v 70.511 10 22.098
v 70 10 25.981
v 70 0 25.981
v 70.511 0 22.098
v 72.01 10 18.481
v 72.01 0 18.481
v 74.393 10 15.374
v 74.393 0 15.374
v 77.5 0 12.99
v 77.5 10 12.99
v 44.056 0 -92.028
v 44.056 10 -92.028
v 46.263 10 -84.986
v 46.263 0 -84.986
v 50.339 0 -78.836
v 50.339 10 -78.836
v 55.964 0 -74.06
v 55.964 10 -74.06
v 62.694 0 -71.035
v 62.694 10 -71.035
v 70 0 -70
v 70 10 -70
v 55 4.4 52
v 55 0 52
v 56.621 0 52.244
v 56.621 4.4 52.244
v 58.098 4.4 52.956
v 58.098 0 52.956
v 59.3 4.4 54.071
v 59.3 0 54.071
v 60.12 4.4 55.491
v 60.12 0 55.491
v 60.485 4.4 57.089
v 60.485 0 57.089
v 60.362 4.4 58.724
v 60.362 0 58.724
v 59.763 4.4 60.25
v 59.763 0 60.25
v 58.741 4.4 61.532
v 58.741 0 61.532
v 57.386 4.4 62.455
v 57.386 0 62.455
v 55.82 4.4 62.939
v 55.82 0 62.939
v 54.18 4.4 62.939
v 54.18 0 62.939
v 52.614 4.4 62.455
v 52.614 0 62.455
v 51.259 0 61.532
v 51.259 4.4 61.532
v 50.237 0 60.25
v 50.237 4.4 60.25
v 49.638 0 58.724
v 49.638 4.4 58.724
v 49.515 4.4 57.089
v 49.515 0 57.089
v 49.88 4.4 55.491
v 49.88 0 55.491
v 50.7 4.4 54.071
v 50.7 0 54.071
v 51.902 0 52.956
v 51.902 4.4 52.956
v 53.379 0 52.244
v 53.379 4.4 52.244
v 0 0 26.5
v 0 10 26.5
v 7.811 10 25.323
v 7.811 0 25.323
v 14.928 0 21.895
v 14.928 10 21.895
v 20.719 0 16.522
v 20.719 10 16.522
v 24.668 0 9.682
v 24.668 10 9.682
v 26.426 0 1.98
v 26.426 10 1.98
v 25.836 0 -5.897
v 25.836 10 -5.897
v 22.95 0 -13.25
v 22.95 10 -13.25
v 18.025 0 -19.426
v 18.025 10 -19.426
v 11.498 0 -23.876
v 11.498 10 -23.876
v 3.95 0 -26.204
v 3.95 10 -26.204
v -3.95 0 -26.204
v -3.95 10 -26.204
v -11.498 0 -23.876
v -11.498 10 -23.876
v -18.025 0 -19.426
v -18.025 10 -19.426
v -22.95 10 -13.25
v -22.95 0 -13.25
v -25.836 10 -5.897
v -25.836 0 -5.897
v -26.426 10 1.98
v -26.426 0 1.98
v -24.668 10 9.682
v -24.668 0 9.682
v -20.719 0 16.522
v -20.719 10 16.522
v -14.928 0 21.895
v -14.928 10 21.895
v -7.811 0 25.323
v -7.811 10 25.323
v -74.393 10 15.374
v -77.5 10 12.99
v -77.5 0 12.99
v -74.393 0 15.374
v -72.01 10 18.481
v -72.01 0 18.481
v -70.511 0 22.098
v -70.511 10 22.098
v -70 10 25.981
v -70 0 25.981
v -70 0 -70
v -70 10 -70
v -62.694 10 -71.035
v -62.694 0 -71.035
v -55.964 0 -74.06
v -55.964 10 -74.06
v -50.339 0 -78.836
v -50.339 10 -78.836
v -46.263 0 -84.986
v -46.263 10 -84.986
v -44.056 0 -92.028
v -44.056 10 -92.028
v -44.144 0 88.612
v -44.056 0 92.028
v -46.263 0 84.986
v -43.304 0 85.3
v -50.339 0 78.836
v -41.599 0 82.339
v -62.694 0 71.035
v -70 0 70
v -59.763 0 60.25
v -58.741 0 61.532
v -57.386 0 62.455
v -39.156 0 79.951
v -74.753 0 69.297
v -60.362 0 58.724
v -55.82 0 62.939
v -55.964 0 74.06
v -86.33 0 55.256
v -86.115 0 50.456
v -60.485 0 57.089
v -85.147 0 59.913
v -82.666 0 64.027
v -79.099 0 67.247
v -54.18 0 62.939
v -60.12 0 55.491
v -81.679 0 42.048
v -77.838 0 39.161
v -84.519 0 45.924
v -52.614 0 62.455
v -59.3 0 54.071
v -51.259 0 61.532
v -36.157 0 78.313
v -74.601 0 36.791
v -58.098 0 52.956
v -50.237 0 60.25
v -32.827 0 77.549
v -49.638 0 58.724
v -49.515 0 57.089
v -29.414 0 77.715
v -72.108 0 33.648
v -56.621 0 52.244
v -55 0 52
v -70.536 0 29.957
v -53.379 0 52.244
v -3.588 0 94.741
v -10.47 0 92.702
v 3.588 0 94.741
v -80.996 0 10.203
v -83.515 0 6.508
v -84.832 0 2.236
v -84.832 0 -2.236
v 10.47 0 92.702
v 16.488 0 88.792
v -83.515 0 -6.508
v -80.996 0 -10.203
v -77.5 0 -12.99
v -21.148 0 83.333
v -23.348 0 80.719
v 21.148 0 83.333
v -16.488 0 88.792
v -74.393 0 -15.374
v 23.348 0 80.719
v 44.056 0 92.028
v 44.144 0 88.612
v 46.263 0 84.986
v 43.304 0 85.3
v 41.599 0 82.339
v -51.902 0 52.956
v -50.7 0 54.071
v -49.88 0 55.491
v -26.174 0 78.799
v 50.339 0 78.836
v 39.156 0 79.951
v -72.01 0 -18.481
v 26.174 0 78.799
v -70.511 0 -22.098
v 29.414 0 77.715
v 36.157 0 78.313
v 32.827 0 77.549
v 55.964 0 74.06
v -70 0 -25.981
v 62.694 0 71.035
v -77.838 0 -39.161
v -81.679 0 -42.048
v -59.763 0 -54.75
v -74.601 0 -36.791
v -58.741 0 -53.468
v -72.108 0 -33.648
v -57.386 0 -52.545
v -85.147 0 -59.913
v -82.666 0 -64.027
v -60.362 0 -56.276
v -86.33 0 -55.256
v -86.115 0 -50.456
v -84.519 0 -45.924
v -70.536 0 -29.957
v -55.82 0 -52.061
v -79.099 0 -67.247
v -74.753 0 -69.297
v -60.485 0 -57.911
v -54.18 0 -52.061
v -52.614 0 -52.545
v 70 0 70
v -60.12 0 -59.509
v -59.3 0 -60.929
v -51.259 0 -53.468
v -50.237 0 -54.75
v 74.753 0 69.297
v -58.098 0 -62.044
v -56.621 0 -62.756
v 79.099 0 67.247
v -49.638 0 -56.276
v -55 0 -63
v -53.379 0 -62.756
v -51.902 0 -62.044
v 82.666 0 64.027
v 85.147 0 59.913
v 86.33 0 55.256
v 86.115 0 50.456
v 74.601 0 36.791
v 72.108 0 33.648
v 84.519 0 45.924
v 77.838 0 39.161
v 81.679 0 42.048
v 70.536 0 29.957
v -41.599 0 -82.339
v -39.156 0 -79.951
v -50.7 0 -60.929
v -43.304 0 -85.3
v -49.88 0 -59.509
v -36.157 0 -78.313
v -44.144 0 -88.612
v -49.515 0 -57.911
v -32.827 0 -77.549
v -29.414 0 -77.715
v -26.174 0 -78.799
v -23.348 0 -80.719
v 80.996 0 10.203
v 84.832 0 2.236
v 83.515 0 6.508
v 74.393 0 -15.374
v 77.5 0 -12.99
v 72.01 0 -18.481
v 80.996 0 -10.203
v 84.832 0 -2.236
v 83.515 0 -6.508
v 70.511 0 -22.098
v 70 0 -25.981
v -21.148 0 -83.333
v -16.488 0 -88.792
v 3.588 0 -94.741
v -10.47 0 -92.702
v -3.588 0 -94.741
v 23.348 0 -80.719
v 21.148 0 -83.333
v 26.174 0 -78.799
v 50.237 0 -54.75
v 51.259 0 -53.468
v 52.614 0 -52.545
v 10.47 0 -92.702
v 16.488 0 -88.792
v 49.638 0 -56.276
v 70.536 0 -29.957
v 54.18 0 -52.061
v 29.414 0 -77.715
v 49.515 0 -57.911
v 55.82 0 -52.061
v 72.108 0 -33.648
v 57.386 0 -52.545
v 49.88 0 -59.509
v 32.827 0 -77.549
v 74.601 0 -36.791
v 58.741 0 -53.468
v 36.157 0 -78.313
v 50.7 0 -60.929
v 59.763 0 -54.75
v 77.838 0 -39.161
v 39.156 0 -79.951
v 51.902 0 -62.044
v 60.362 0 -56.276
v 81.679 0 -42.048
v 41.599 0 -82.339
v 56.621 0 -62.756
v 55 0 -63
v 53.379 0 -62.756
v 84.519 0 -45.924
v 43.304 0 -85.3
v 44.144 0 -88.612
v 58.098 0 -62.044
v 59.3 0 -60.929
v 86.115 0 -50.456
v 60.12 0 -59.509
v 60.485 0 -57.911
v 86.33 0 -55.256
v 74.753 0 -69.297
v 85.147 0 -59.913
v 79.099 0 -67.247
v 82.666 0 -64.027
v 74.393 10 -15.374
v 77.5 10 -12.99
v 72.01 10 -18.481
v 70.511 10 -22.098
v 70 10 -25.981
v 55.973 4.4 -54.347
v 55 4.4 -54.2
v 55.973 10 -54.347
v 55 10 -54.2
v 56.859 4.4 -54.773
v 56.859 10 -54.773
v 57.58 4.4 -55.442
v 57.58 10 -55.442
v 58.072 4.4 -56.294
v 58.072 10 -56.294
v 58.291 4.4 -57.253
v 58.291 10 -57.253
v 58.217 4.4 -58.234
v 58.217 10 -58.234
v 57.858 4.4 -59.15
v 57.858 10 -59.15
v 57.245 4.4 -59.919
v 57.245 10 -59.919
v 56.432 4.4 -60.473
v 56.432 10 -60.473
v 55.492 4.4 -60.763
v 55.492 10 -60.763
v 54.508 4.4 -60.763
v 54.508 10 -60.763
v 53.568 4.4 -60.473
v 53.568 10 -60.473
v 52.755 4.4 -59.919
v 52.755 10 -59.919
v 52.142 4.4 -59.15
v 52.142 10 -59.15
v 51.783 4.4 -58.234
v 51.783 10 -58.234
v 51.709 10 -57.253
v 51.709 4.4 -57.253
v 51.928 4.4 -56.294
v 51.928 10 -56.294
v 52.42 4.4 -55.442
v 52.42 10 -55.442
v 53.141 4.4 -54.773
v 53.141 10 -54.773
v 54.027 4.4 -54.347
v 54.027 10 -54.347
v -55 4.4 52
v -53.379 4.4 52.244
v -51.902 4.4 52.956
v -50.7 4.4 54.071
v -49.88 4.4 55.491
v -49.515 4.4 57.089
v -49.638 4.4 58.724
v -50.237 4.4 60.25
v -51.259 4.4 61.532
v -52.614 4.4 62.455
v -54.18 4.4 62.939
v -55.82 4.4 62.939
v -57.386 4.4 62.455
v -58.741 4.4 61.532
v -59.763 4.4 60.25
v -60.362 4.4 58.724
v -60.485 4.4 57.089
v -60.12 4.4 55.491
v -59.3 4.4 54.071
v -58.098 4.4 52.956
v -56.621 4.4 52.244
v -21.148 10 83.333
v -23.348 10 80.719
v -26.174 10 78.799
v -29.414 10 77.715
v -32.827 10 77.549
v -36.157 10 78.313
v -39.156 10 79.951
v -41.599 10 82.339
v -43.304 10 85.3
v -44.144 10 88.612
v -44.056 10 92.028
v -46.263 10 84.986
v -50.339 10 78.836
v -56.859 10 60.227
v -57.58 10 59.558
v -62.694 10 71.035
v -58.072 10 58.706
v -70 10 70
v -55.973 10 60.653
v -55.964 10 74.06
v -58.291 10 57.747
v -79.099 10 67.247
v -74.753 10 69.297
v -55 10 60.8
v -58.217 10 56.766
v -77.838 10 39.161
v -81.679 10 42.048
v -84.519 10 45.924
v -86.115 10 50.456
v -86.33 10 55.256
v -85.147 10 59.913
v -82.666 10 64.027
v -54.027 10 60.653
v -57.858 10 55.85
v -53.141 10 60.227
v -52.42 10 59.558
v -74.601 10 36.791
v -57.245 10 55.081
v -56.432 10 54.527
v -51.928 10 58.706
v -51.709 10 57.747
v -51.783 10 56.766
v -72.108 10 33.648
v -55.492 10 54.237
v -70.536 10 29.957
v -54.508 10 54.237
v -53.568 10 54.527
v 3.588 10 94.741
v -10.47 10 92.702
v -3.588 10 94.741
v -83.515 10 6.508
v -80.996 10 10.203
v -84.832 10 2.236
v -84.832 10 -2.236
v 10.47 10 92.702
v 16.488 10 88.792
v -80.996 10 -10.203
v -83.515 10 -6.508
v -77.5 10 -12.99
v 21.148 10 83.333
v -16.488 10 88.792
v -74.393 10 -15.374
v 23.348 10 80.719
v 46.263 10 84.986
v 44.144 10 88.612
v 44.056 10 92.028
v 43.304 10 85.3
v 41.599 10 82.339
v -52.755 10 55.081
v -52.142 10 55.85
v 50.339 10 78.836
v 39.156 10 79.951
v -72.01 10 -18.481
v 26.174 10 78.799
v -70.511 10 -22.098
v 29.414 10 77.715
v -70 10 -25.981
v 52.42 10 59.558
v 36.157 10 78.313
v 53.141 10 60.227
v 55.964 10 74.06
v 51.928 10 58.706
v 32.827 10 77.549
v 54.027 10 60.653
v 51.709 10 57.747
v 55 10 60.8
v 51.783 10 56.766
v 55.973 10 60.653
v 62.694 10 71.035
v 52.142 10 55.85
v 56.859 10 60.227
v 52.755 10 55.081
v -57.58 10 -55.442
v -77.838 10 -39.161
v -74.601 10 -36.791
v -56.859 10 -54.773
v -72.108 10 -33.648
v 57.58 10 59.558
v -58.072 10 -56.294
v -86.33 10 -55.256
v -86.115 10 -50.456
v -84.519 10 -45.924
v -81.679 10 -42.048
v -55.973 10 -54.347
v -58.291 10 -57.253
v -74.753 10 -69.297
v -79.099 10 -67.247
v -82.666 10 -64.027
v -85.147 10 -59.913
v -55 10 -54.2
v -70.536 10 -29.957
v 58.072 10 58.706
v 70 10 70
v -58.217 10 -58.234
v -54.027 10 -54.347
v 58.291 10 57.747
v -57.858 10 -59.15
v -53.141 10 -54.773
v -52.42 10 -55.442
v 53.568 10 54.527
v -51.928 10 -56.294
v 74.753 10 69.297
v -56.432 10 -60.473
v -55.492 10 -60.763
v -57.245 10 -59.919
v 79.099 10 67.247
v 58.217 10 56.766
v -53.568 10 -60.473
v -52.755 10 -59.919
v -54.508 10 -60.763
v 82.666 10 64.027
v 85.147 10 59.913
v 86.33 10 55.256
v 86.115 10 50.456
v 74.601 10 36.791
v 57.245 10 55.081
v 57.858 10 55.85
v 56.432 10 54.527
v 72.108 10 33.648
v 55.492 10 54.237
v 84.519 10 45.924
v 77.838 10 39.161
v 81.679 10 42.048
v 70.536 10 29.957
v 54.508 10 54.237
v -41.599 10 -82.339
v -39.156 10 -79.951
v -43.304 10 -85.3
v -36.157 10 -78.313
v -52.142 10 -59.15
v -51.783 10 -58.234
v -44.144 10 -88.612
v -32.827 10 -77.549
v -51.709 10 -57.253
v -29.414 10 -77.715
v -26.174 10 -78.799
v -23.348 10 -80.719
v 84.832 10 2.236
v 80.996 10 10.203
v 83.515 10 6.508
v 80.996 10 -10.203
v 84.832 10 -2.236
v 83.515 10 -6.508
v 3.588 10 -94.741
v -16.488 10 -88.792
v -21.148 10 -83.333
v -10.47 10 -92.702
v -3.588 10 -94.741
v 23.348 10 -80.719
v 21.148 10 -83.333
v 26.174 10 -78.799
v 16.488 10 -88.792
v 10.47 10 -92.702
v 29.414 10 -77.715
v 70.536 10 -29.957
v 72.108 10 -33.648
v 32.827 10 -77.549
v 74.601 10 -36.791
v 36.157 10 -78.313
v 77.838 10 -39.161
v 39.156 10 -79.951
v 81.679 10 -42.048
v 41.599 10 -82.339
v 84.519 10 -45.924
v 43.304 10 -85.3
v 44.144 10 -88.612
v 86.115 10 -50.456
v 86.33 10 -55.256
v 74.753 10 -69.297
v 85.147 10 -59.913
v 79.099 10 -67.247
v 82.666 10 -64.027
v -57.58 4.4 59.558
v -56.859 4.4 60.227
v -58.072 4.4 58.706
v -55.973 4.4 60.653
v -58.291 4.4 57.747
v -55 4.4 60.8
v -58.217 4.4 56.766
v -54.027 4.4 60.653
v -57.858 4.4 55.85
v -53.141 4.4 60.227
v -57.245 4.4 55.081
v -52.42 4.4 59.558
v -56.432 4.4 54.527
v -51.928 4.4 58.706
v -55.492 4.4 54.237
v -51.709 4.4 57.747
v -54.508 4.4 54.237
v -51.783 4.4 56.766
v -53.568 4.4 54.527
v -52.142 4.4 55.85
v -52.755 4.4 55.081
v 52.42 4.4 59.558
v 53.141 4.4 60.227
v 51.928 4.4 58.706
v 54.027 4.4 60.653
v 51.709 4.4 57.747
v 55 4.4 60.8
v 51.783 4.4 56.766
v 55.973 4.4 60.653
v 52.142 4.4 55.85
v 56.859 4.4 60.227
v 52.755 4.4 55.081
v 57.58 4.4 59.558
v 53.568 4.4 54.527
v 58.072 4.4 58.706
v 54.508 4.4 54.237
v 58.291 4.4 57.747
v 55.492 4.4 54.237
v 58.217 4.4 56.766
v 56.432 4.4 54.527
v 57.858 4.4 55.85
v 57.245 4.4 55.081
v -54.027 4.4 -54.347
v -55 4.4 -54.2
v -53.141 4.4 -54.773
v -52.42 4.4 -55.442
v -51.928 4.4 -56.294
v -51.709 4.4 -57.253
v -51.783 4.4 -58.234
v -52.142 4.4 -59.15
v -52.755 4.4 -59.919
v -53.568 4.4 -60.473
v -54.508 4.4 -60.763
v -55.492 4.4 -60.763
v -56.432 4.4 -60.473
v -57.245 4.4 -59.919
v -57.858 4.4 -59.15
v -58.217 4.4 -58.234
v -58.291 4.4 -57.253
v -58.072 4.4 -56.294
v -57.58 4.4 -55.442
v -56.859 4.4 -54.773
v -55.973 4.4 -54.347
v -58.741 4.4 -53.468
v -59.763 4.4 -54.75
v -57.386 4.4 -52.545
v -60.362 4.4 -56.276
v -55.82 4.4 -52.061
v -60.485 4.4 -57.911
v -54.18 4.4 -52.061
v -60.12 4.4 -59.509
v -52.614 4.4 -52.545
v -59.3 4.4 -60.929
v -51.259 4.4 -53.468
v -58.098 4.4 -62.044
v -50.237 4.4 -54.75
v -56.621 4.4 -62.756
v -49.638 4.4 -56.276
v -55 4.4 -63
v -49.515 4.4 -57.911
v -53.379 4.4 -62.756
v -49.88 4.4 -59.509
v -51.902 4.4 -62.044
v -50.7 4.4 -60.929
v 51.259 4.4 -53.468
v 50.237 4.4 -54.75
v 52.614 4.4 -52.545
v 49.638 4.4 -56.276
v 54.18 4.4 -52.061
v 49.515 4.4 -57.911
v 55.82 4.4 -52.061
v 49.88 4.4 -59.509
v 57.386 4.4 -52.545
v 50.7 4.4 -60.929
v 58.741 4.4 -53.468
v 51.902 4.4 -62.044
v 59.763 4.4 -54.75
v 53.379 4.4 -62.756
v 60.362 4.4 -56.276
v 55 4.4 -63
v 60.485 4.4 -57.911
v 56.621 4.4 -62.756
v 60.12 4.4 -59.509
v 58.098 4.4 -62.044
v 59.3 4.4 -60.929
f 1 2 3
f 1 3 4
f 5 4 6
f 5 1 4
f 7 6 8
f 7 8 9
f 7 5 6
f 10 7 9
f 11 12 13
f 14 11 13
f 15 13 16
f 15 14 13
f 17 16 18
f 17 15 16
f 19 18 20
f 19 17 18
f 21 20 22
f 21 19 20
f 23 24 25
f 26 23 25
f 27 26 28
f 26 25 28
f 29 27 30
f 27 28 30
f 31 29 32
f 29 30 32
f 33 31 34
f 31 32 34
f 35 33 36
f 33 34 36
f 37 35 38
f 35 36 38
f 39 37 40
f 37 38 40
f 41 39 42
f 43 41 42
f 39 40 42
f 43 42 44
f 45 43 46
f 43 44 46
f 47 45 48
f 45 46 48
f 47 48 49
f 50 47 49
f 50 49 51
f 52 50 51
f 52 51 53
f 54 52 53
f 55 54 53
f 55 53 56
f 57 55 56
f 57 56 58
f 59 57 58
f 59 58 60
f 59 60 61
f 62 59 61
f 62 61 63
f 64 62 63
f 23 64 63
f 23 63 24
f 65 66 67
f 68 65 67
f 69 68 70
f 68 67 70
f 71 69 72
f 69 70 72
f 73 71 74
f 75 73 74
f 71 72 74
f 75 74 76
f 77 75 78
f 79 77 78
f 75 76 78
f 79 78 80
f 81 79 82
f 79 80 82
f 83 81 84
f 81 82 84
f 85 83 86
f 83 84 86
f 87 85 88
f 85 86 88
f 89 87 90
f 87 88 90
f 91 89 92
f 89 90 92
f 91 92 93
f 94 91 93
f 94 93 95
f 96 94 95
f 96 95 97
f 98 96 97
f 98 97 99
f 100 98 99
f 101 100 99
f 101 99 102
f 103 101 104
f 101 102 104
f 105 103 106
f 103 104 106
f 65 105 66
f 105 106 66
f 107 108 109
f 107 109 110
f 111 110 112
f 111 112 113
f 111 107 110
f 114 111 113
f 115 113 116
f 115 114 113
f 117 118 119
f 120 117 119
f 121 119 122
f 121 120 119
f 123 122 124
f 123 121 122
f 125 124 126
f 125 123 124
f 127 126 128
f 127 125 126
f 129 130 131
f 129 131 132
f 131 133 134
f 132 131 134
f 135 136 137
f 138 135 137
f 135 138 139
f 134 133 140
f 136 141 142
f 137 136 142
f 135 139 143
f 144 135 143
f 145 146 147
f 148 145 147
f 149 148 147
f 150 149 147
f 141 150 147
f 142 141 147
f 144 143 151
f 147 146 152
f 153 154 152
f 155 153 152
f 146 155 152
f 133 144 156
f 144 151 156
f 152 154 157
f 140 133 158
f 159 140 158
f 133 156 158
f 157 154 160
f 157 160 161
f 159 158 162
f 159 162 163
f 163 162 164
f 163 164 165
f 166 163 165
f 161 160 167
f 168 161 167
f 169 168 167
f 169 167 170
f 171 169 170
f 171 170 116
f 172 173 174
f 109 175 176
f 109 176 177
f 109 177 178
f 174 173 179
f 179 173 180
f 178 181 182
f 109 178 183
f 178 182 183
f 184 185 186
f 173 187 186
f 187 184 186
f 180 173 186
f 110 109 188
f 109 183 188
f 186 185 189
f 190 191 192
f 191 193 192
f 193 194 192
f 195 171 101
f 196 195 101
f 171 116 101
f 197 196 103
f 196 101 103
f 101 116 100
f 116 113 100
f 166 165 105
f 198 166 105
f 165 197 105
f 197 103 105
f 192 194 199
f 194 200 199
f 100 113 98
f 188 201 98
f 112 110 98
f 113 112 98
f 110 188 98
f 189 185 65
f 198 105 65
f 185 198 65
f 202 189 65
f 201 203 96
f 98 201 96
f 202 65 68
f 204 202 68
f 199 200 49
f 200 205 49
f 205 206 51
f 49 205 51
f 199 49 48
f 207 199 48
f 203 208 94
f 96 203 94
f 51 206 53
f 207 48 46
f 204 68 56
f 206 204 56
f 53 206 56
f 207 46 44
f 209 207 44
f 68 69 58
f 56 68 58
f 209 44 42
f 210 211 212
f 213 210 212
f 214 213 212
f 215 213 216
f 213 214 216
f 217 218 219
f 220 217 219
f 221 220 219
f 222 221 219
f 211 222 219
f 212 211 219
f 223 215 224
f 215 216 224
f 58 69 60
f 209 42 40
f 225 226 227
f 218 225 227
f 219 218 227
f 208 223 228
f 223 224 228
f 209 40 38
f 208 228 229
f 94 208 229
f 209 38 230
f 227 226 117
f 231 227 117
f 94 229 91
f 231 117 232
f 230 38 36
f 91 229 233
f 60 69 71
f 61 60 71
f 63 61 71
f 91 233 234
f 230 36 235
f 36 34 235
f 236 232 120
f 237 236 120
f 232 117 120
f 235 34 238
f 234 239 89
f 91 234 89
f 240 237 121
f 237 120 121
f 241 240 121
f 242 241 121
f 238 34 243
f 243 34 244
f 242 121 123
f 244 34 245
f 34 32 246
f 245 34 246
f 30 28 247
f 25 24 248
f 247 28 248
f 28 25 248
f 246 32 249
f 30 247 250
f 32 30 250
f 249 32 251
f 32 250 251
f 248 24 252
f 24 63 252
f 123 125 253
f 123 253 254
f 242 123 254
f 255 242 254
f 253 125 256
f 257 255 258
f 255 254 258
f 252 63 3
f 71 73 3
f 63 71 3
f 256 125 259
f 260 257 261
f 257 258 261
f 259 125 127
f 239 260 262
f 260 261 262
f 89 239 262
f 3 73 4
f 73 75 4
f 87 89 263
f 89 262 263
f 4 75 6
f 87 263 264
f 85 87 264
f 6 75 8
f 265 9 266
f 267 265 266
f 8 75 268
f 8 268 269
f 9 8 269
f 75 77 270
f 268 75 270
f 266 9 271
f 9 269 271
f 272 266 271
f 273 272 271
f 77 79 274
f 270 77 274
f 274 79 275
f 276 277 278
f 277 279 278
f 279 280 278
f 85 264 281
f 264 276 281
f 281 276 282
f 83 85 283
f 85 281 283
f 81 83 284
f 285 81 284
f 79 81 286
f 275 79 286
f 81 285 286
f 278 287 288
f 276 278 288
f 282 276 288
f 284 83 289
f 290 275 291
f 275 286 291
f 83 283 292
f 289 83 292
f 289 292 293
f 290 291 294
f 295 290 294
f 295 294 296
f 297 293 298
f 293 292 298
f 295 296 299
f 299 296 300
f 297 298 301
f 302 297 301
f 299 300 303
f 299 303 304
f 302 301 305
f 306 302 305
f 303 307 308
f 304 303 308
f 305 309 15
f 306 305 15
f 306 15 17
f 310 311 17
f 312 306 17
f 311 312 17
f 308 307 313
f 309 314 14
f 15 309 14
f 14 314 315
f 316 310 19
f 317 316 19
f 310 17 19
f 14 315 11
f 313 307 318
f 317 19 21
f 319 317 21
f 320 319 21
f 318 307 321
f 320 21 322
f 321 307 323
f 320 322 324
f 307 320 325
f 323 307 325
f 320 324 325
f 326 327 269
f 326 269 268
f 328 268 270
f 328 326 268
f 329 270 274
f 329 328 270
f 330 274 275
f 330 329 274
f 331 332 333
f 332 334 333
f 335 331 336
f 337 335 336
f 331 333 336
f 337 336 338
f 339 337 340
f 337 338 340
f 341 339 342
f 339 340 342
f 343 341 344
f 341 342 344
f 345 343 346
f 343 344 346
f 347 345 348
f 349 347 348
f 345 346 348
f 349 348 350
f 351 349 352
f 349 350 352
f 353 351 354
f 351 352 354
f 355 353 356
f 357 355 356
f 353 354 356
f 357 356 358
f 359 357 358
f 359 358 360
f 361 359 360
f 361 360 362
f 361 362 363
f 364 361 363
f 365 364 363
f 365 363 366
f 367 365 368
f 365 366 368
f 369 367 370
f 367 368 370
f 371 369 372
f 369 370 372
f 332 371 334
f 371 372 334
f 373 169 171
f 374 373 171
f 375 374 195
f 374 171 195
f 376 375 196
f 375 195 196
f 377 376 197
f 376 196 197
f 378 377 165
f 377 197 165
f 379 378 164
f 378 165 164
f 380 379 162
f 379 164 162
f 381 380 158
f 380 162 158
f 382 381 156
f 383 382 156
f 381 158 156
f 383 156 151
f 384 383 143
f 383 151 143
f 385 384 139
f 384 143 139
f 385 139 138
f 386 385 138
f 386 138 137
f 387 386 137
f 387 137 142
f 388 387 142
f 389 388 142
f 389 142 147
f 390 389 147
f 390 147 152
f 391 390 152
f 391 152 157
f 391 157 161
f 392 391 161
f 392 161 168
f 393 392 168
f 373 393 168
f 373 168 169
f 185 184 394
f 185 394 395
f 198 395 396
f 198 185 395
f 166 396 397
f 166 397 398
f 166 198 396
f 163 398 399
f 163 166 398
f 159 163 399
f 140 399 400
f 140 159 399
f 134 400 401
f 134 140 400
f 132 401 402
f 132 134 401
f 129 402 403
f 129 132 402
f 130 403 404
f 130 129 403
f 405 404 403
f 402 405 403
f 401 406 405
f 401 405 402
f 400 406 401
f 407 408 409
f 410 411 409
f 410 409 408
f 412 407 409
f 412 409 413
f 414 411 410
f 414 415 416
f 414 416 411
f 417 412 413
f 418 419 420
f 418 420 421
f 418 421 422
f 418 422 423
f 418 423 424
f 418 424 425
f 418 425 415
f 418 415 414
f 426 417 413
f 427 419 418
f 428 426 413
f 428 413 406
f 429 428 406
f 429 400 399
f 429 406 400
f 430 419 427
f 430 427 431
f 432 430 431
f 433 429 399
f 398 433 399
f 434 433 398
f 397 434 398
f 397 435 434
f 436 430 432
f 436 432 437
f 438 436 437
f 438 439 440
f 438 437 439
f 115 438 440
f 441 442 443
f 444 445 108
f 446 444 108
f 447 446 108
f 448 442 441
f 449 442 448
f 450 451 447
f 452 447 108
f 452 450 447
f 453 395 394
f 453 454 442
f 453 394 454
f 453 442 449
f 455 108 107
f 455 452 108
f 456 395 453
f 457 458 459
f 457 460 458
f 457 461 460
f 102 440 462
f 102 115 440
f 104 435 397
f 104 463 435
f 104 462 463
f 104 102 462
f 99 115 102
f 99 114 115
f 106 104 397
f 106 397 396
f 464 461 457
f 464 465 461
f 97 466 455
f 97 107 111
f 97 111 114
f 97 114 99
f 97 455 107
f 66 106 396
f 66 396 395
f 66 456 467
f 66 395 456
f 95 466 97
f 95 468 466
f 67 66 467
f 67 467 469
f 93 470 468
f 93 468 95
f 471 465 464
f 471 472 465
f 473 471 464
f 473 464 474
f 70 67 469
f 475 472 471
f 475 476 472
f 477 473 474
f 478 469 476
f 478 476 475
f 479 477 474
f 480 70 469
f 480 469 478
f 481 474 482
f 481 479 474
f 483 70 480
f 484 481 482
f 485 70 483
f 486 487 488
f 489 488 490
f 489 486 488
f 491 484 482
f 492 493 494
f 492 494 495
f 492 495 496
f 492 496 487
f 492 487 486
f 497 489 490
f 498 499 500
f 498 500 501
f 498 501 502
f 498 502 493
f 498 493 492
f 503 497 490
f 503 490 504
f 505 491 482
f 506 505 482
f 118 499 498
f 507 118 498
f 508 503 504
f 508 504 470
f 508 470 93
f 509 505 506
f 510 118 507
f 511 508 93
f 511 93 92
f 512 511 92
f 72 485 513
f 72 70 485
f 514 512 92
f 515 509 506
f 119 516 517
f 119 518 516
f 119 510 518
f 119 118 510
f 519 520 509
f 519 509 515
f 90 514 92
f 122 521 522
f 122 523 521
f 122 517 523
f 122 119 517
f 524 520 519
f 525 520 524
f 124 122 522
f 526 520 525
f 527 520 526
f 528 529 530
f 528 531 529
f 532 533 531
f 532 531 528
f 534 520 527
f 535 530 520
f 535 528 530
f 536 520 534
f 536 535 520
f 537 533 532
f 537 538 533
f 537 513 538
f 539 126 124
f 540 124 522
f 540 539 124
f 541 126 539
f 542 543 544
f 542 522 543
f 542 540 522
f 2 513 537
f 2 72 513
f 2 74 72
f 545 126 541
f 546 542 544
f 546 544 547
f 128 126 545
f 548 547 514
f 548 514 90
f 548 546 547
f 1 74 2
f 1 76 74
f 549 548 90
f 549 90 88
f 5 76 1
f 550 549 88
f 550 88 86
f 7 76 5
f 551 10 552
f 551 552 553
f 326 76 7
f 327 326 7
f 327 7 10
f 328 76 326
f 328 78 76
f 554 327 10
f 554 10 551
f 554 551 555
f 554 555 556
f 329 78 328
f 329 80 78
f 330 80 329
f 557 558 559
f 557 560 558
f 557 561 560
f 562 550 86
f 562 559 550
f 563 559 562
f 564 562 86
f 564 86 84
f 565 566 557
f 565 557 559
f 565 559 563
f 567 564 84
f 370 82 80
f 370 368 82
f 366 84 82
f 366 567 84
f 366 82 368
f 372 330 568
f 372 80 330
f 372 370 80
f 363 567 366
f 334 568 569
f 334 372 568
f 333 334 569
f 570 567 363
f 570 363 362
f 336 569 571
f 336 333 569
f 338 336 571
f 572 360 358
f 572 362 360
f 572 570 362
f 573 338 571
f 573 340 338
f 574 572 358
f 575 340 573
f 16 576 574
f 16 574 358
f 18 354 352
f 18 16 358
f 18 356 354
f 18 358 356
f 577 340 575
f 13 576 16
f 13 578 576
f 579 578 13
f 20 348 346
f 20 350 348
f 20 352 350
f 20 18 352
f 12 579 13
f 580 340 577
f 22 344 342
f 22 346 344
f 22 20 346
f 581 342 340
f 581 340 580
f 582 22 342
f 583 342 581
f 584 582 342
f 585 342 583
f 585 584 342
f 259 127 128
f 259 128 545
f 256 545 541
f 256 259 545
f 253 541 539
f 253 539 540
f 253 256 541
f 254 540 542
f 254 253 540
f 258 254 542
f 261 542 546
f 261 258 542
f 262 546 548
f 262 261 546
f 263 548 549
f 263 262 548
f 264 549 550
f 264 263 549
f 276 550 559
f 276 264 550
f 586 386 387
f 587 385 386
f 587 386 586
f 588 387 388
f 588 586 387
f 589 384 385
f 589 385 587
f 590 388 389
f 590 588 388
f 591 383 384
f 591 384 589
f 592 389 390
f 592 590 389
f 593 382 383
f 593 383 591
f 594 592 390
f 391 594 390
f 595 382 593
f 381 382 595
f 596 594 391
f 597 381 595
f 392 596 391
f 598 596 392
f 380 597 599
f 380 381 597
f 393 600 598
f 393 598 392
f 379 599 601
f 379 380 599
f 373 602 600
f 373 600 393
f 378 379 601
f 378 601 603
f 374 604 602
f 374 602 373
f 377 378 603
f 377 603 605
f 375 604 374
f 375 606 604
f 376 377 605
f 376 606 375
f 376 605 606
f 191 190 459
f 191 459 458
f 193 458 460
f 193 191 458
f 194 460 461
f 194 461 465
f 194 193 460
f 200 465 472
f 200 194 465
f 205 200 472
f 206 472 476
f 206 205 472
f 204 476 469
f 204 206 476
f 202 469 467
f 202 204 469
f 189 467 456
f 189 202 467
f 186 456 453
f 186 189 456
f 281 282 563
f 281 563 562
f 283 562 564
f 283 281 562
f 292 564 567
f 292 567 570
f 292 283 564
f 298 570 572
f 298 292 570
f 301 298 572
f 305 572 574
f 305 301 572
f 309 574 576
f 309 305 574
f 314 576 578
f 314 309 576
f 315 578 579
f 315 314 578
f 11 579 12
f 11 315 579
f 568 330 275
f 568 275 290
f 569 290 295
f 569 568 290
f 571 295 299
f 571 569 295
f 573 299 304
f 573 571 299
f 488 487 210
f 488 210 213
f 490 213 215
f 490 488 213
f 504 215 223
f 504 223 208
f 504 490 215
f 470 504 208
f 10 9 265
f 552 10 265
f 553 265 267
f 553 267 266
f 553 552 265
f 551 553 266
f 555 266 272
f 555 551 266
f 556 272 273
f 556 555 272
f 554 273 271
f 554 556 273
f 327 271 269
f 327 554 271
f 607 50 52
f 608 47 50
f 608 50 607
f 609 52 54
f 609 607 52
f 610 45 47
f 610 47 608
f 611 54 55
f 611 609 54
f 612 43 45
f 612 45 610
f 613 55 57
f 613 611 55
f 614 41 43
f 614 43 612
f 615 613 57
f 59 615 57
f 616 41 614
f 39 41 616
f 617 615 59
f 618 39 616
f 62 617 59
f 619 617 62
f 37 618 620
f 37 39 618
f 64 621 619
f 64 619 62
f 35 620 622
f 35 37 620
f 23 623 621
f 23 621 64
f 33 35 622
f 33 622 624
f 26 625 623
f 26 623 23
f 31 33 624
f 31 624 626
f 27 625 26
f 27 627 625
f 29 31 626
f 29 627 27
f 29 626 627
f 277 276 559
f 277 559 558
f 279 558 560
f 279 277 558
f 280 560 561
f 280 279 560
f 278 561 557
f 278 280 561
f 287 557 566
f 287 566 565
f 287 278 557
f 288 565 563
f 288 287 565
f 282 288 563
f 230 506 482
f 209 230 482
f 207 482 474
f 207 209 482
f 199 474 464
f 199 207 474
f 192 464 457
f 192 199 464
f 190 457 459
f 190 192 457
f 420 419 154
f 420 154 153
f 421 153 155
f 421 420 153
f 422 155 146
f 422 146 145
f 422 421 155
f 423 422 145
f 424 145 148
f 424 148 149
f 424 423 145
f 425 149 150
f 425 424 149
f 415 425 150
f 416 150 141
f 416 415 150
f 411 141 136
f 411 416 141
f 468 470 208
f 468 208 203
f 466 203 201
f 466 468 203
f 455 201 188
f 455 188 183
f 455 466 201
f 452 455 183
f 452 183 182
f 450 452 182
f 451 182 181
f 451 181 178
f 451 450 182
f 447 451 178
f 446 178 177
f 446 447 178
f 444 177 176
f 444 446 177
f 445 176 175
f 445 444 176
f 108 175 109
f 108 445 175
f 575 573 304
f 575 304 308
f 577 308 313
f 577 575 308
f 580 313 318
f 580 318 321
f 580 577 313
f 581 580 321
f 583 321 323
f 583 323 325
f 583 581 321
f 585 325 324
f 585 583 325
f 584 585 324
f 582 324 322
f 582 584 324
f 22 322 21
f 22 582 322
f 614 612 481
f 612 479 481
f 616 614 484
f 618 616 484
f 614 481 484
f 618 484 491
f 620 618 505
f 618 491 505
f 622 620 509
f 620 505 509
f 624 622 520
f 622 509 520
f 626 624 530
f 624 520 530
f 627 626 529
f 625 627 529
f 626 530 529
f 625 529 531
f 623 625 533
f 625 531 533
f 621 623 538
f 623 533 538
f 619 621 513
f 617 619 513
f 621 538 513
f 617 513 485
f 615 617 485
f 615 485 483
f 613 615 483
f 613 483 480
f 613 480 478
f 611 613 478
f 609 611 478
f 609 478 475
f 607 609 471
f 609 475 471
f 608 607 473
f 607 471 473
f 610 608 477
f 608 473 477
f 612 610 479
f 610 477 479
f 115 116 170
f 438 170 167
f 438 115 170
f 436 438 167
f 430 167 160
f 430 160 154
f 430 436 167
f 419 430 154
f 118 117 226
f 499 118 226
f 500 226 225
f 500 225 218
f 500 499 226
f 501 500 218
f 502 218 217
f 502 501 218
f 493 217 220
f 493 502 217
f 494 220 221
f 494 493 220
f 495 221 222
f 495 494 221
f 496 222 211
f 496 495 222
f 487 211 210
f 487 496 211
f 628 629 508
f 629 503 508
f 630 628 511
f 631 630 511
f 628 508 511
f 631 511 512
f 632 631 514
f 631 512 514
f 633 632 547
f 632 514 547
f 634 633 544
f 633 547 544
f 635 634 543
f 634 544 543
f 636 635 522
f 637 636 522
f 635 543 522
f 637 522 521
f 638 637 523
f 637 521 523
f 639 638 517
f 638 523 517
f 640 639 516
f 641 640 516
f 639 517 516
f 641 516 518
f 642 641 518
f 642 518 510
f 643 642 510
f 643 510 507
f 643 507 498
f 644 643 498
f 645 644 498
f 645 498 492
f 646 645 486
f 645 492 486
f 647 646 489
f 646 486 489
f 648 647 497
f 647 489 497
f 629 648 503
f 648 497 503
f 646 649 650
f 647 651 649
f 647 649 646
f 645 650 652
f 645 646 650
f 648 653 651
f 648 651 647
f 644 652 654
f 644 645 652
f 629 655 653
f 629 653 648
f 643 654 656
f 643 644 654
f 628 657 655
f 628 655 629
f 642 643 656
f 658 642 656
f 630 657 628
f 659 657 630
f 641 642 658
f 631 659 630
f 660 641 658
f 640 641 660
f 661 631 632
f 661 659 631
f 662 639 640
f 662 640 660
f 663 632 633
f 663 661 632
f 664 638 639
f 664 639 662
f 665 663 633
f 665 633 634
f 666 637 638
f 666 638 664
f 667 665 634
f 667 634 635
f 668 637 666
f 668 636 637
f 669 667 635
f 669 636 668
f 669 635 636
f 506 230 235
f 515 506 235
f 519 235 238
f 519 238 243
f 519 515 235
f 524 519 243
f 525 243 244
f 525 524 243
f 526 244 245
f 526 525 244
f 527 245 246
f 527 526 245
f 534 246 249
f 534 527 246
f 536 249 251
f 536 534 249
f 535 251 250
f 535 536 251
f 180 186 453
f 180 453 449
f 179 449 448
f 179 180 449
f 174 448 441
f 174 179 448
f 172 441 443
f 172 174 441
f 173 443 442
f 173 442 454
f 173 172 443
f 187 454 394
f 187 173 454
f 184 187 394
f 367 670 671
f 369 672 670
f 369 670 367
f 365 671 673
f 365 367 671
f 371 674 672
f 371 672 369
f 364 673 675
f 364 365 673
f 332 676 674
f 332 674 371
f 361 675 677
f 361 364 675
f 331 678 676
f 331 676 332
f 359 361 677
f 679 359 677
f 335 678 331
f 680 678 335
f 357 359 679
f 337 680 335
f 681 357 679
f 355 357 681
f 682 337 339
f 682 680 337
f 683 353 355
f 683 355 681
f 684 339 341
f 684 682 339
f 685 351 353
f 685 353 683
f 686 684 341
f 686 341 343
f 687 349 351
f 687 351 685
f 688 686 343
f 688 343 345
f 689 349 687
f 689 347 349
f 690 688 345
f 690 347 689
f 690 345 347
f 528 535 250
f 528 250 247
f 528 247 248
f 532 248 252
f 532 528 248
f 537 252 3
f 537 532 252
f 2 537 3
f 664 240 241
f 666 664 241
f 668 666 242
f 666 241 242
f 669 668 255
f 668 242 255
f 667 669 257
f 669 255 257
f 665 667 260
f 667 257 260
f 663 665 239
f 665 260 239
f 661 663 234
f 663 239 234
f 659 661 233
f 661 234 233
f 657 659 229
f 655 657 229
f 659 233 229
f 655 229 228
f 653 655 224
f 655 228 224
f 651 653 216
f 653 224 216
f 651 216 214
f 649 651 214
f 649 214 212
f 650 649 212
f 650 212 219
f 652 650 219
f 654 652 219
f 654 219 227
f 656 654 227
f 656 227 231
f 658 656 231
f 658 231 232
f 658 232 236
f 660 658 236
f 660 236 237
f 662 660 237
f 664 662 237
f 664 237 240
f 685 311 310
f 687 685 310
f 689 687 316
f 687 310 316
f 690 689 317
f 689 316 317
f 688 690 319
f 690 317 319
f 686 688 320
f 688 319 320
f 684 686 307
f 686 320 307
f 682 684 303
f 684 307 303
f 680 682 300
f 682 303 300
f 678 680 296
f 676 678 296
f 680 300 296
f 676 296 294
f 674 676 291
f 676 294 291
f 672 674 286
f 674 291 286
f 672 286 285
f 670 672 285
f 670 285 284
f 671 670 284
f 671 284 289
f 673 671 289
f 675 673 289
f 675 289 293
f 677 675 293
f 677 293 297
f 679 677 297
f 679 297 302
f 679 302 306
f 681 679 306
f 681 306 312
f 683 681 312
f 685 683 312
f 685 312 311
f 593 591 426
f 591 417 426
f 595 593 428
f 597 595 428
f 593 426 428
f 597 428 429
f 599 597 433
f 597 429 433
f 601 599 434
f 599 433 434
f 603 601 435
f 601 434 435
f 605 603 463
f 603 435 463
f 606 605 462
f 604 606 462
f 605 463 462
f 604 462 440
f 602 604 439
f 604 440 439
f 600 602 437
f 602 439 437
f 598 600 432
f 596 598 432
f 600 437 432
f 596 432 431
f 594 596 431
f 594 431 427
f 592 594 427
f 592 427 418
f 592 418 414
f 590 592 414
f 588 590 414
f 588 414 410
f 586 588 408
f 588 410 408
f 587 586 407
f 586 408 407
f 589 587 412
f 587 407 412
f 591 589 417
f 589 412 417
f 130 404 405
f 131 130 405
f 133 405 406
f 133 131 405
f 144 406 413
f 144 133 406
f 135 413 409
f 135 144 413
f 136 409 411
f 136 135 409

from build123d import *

# Parameters (mm, degrees)
SALIENTE_EXTRUIR1_DEPTH                              = 10
SALIENTE_EXTRUIR2_DEPTH                              = 10
CROQUIS3_R                                           = 26.5
CORTAR_EXTRUIR1_DEPTH                                = 10
REFRENTADO_PARA_TORNILLO_CON_CABEZA_HUEC_D           = 6.6
REFRENTADO_PARA_TORNILLO_CON_CABEZA_HUEC_CBORE_D     = 11
REFRENTADO_PARA_TORNILLO_CON_CABEZA_HUEC_CBORE_DEPTH = 4.4


with BuildPart() as part:
    # Croquis1 → Saliente-Extruir1 (new body)
    with BuildSketch(Plane(origin=(0, 0, 0), x_dir=(1, 0, 0), z_dir=(0, 1, 0))):
        with BuildLine():
            Line((-70, -70), (-70, 70))
            ThreePointArc((-70, 70), (-52.983030462, 76.249658661), (-44.055908755, 92.027554074))
            ThreePointArc((-44.055908755, 92.027554074), (-36.156795126, 78.313355526), (-21.147629234, 83.333333333))
            ThreePointArc((-21.147629234, 83.333333333), (0, 95), (21.147629234, 83.333333333))
            ThreePointArc((21.147629234, 83.333333333), (36.156795126, 78.313355526), (44.055908755, 92.027554074))
            ThreePointArc((44.055908755, 92.027554074), (52.983030462, 76.249658661), (70, 70))
            Line((70, 70), (70, -70))
            ThreePointArc((70, -70), (52.983030462, -76.249658661), (44.055908755, -92.027554074))
            ThreePointArc((44.055908755, -92.027554074), (36.156795126, -78.313355526), (21.147629234, -83.333333333))
            ThreePointArc((21.147629234, -83.333333333), (0, -95), (-21.147629234, -83.333333333))
            ThreePointArc((-21.147629234, -83.333333333), (-36.156795126, -78.313355526), (-44.055908755, -92.027554074))
            ThreePointArc((-44.055908755, -92.027554074), (-52.983030462, -76.249658661), (-70, -70))
        make_face()
    extrude(amount=SALIENTE_EXTRUIR1_DEPTH)

    # Croquis2 → Saliente-Extruir2 (add)
    with BuildSketch(Plane(origin=(0, 10, 0), x_dir=(1, 0, 0), z_dir=(0, 1, 0))):
        with BuildLine():
            Line((-70, 25.98076189), (-70, 70))
            ThreePointArc((-70, 70), (-85.909969357, 57.627811916), (-77.837993487, 39.160506523))
            ThreePointArc((-77.837993487, 39.160506523), (-72.107558403, 33.647896498), (-70, 25.98076189))
        make_face()
        with BuildLine():
            ThreePointArc((77.837993487, 39.160506523), (85.909969357, 57.627811916), (70, 70))
            Line((70, 70), (70, 25.98076213))
            ThreePointArc((70, 25.98076213), (72.107558465, 33.647896602), (77.837993487, 39.160506523))
        make_face()
        with BuildLine():
            ThreePointArc((77.5, 12.990381057), (72.009618939, 18.480762121), (70, 25.98076213))
            Line((70, 25.98076213), (70, -25.98076213))
            ThreePointArc((70, -25.98076213), (72.009618939, -18.480762121), (77.5, -12.990381057))
            ThreePointArc((77.5, -12.990381057), (85, 0), (77.5, 12.990381057))
        make_face()
        with BuildLine():
            Line((-70, -25.980762199), (-70, 25.98076189))
            ThreePointArc((-70, 25.98076189), (-72.009618999, 18.480762017), (-77.5, 12.990381057))
            ThreePointArc((-77.5, 12.990381057), (-85, 0), (-77.5, -12.990381057))
            ThreePointArc((-77.5, -12.990381057), (-72.009618922, -18.480762151), (-70, -25.980762199))
        make_face()
        with BuildLine():
            Line((-70, -70), (-70, -25.980762199))
            ThreePointArc((-70, -25.980762199), (-72.107558482, -33.647896631), (-77.837993487, -39.160506523))
            ThreePointArc((-77.837993487, -39.160506523), (-85.909969357, -57.627811916), (-70, -70))
        make_face()
        with BuildLine():
            ThreePointArc((77.837993487, -39.160506523), (72.107558465, -33.647896602), (70, -25.98076213))
            Line((70, -25.98076213), (70, -70))
            ThreePointArc((70, -70), (85.909969357, -57.627811916), (77.837993487, -39.160506523))
        make_face()
    extrude(amount=-SALIENTE_EXTRUIR2_DEPTH)

    # Croquis3 → Cortar-Extruir1 (cut)
    with BuildSketch(Plane(origin=(0, 10, 0), x_dir=(1, 0, 0), z_dir=(0, 1, 0))):
        with Locations(Location((0, 0, 0), (0, 0, 270))):
            Circle(CROQUIS3_R)
    extrude(amount=-CORTAR_EXTRUIR1_DEPTH, mode=Mode.SUBTRACT)

    # Refrentado para tornillo con cabeza hueca de M61 (through all)
    with Locations(Plane(origin=(-55, 0, 57.5), x_dir=(0, 0, -1), z_dir=(0, -1, 0))):
        with Locations((0, 0), (0, 110), (115, 110), (115, 0), (57.5, 55)):
            CounterBoreHole(REFRENTADO_PARA_TORNILLO_CON_CABEZA_HUEC_D / 2, REFRENTADO_PARA_TORNILLO_CON_CABEZA_HUEC_CBORE_D / 2, REFRENTADO_PARA_TORNILLO_CON_CABEZA_HUEC_CBORE_DEPTH)


solid = part.part
